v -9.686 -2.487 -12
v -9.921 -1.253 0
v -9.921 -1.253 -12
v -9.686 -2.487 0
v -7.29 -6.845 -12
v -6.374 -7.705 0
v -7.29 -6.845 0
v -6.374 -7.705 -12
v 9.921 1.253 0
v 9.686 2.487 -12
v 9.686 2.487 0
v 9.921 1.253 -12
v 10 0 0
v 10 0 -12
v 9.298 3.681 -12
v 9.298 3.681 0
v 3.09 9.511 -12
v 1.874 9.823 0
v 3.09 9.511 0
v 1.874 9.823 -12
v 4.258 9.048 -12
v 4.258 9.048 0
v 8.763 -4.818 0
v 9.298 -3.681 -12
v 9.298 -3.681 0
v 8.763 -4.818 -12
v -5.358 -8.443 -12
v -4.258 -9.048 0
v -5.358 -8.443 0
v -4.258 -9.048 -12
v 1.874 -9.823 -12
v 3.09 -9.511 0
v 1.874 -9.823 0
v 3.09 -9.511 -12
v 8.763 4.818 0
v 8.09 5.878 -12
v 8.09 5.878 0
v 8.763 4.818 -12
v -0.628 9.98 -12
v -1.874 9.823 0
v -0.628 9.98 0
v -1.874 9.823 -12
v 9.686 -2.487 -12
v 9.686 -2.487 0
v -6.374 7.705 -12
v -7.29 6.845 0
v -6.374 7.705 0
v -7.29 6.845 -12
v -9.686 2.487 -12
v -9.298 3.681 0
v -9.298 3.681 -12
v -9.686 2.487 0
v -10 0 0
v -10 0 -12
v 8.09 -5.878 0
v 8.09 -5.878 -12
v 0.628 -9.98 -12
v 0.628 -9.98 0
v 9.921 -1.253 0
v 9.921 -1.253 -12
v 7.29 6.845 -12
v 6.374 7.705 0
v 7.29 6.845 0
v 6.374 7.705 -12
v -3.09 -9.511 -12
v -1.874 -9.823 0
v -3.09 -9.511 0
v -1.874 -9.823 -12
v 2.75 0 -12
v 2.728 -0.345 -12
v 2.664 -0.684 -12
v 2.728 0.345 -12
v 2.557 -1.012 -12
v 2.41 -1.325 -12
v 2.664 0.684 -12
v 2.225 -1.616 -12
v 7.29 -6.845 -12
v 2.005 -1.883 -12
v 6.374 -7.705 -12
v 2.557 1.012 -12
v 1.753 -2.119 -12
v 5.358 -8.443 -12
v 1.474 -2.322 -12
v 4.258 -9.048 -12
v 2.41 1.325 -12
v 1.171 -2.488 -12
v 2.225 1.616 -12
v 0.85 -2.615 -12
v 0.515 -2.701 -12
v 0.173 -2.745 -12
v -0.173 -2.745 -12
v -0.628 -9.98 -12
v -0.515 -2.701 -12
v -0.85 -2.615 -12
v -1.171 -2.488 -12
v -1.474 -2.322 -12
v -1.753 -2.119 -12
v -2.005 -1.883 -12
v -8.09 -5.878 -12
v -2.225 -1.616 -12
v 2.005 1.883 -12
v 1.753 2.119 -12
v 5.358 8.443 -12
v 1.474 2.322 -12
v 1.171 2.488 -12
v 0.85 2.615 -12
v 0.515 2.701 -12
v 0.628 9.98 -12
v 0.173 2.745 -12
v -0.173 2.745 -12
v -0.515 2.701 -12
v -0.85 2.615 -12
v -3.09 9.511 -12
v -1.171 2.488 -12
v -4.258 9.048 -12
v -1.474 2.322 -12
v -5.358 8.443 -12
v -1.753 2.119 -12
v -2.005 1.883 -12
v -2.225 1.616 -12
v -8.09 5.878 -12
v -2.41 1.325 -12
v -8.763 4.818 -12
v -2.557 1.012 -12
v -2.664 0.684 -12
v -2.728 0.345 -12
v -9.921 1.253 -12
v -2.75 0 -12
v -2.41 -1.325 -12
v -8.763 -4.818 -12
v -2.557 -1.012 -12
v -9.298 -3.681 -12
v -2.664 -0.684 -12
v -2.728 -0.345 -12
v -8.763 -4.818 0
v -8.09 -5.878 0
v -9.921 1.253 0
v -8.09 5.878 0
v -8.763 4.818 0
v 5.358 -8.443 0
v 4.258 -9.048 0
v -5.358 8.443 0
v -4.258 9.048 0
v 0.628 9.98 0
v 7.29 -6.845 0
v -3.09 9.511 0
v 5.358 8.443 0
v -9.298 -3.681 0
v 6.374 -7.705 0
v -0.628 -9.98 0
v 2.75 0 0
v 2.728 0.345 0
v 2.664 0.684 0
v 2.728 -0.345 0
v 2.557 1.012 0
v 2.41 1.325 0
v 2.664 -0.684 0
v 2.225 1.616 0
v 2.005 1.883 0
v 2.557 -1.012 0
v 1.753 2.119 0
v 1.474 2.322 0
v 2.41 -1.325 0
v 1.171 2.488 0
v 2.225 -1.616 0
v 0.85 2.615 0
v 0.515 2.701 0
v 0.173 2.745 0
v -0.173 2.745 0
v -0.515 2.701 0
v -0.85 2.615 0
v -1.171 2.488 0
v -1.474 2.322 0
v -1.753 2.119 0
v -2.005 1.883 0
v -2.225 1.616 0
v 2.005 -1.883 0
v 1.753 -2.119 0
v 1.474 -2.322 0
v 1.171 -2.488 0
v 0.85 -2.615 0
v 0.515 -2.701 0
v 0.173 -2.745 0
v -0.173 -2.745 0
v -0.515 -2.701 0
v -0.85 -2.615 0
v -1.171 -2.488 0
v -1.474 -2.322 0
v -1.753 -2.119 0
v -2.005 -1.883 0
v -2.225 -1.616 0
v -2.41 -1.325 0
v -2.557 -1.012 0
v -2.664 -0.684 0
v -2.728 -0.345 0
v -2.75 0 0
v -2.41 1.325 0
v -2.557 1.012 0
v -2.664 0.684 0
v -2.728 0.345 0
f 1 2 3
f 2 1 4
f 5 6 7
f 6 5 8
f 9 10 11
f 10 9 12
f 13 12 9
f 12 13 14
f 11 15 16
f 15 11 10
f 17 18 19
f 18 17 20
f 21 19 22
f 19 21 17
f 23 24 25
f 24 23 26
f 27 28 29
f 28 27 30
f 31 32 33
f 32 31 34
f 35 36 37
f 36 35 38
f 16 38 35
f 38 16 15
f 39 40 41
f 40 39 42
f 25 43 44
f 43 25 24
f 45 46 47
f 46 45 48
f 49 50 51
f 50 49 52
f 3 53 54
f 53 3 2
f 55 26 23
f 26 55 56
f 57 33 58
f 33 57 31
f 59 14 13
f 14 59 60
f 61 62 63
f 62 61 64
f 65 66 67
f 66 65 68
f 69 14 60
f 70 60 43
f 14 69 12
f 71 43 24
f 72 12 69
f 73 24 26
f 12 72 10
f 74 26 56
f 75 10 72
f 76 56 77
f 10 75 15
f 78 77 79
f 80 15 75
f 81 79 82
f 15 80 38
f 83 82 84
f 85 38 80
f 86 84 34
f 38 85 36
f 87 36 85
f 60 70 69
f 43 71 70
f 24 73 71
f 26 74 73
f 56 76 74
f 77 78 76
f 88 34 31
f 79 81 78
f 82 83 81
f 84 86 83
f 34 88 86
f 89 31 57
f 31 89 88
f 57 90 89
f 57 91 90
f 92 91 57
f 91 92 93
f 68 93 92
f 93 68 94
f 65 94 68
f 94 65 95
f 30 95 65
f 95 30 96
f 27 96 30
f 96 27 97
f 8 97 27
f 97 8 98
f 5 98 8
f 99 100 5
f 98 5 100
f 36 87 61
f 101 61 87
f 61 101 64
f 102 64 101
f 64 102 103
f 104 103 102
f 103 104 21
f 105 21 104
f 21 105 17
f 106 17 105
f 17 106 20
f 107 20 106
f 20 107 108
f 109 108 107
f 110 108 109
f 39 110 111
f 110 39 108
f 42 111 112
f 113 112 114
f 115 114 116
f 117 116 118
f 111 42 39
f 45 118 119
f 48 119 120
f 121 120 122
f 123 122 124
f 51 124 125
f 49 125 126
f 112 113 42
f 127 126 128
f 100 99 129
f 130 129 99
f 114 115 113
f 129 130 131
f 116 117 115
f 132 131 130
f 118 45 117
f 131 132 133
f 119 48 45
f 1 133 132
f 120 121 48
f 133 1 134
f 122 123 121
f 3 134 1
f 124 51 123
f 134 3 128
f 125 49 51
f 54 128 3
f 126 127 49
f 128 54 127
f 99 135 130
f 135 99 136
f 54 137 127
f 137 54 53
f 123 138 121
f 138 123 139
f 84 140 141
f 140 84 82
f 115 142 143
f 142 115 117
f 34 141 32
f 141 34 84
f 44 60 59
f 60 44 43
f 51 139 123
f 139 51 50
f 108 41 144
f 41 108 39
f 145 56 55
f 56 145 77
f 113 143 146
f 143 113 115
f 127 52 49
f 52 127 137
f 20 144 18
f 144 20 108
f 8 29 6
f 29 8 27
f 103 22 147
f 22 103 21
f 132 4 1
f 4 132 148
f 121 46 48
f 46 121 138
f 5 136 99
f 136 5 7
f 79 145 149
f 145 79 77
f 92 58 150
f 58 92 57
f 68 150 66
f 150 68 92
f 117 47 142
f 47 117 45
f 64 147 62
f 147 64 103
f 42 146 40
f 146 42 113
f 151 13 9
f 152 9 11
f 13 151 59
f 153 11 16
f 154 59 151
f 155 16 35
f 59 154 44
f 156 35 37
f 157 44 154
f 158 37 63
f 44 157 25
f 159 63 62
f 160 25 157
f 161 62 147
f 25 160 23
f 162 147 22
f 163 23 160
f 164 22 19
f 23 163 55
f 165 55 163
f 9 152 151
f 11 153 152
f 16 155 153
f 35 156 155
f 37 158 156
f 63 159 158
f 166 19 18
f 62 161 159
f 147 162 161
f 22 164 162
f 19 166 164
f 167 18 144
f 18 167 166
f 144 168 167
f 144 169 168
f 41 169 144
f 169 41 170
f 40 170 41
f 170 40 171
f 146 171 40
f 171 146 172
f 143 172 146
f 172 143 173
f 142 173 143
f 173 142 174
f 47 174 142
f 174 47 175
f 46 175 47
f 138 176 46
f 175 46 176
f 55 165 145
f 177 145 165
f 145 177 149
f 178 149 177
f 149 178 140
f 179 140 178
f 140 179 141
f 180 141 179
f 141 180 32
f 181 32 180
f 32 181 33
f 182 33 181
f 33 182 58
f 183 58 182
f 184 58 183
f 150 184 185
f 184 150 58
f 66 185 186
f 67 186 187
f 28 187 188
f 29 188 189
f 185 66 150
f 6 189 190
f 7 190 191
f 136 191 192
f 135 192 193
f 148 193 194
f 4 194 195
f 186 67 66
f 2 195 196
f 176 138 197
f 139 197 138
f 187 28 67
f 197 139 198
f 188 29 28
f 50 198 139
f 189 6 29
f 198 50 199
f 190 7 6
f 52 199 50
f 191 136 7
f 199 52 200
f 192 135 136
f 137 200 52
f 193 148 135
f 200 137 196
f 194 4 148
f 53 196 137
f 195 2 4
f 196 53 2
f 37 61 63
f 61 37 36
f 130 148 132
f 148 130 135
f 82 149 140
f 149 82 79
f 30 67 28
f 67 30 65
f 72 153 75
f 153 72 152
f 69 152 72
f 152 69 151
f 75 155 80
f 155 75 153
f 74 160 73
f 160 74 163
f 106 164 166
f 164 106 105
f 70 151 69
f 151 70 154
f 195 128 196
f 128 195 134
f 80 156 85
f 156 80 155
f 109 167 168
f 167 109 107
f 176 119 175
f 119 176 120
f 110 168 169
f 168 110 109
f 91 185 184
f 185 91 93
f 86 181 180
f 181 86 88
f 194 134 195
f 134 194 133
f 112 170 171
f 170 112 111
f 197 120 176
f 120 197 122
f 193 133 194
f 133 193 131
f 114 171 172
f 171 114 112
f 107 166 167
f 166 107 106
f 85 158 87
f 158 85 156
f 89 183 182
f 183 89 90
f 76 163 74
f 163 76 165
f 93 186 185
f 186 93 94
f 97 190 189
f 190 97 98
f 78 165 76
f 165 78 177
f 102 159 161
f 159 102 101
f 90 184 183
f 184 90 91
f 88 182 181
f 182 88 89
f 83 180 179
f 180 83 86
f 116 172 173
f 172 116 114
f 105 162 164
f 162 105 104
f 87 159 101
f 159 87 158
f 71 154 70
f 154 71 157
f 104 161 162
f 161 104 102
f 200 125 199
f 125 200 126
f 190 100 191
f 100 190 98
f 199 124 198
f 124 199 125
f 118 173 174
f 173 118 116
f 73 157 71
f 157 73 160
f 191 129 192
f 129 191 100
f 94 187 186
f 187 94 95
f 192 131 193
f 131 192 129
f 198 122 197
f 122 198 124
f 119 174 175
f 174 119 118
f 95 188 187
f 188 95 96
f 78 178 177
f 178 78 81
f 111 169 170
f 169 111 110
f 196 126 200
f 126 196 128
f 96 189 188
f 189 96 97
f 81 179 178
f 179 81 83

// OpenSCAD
$fn = 50;


difference() {
	union() {
		translate(v = [0, 0, -12.0000000000]) {
			cylinder(h = 12, r = 10.0000000000);
		}
		cylinder(h = 0, r = 13.0000000000);
	}
	union() {
		#translate(v = [0, 0, -12]) {
			cylinder(h = 12, r = 2.7500000000);
		}
	}
}
